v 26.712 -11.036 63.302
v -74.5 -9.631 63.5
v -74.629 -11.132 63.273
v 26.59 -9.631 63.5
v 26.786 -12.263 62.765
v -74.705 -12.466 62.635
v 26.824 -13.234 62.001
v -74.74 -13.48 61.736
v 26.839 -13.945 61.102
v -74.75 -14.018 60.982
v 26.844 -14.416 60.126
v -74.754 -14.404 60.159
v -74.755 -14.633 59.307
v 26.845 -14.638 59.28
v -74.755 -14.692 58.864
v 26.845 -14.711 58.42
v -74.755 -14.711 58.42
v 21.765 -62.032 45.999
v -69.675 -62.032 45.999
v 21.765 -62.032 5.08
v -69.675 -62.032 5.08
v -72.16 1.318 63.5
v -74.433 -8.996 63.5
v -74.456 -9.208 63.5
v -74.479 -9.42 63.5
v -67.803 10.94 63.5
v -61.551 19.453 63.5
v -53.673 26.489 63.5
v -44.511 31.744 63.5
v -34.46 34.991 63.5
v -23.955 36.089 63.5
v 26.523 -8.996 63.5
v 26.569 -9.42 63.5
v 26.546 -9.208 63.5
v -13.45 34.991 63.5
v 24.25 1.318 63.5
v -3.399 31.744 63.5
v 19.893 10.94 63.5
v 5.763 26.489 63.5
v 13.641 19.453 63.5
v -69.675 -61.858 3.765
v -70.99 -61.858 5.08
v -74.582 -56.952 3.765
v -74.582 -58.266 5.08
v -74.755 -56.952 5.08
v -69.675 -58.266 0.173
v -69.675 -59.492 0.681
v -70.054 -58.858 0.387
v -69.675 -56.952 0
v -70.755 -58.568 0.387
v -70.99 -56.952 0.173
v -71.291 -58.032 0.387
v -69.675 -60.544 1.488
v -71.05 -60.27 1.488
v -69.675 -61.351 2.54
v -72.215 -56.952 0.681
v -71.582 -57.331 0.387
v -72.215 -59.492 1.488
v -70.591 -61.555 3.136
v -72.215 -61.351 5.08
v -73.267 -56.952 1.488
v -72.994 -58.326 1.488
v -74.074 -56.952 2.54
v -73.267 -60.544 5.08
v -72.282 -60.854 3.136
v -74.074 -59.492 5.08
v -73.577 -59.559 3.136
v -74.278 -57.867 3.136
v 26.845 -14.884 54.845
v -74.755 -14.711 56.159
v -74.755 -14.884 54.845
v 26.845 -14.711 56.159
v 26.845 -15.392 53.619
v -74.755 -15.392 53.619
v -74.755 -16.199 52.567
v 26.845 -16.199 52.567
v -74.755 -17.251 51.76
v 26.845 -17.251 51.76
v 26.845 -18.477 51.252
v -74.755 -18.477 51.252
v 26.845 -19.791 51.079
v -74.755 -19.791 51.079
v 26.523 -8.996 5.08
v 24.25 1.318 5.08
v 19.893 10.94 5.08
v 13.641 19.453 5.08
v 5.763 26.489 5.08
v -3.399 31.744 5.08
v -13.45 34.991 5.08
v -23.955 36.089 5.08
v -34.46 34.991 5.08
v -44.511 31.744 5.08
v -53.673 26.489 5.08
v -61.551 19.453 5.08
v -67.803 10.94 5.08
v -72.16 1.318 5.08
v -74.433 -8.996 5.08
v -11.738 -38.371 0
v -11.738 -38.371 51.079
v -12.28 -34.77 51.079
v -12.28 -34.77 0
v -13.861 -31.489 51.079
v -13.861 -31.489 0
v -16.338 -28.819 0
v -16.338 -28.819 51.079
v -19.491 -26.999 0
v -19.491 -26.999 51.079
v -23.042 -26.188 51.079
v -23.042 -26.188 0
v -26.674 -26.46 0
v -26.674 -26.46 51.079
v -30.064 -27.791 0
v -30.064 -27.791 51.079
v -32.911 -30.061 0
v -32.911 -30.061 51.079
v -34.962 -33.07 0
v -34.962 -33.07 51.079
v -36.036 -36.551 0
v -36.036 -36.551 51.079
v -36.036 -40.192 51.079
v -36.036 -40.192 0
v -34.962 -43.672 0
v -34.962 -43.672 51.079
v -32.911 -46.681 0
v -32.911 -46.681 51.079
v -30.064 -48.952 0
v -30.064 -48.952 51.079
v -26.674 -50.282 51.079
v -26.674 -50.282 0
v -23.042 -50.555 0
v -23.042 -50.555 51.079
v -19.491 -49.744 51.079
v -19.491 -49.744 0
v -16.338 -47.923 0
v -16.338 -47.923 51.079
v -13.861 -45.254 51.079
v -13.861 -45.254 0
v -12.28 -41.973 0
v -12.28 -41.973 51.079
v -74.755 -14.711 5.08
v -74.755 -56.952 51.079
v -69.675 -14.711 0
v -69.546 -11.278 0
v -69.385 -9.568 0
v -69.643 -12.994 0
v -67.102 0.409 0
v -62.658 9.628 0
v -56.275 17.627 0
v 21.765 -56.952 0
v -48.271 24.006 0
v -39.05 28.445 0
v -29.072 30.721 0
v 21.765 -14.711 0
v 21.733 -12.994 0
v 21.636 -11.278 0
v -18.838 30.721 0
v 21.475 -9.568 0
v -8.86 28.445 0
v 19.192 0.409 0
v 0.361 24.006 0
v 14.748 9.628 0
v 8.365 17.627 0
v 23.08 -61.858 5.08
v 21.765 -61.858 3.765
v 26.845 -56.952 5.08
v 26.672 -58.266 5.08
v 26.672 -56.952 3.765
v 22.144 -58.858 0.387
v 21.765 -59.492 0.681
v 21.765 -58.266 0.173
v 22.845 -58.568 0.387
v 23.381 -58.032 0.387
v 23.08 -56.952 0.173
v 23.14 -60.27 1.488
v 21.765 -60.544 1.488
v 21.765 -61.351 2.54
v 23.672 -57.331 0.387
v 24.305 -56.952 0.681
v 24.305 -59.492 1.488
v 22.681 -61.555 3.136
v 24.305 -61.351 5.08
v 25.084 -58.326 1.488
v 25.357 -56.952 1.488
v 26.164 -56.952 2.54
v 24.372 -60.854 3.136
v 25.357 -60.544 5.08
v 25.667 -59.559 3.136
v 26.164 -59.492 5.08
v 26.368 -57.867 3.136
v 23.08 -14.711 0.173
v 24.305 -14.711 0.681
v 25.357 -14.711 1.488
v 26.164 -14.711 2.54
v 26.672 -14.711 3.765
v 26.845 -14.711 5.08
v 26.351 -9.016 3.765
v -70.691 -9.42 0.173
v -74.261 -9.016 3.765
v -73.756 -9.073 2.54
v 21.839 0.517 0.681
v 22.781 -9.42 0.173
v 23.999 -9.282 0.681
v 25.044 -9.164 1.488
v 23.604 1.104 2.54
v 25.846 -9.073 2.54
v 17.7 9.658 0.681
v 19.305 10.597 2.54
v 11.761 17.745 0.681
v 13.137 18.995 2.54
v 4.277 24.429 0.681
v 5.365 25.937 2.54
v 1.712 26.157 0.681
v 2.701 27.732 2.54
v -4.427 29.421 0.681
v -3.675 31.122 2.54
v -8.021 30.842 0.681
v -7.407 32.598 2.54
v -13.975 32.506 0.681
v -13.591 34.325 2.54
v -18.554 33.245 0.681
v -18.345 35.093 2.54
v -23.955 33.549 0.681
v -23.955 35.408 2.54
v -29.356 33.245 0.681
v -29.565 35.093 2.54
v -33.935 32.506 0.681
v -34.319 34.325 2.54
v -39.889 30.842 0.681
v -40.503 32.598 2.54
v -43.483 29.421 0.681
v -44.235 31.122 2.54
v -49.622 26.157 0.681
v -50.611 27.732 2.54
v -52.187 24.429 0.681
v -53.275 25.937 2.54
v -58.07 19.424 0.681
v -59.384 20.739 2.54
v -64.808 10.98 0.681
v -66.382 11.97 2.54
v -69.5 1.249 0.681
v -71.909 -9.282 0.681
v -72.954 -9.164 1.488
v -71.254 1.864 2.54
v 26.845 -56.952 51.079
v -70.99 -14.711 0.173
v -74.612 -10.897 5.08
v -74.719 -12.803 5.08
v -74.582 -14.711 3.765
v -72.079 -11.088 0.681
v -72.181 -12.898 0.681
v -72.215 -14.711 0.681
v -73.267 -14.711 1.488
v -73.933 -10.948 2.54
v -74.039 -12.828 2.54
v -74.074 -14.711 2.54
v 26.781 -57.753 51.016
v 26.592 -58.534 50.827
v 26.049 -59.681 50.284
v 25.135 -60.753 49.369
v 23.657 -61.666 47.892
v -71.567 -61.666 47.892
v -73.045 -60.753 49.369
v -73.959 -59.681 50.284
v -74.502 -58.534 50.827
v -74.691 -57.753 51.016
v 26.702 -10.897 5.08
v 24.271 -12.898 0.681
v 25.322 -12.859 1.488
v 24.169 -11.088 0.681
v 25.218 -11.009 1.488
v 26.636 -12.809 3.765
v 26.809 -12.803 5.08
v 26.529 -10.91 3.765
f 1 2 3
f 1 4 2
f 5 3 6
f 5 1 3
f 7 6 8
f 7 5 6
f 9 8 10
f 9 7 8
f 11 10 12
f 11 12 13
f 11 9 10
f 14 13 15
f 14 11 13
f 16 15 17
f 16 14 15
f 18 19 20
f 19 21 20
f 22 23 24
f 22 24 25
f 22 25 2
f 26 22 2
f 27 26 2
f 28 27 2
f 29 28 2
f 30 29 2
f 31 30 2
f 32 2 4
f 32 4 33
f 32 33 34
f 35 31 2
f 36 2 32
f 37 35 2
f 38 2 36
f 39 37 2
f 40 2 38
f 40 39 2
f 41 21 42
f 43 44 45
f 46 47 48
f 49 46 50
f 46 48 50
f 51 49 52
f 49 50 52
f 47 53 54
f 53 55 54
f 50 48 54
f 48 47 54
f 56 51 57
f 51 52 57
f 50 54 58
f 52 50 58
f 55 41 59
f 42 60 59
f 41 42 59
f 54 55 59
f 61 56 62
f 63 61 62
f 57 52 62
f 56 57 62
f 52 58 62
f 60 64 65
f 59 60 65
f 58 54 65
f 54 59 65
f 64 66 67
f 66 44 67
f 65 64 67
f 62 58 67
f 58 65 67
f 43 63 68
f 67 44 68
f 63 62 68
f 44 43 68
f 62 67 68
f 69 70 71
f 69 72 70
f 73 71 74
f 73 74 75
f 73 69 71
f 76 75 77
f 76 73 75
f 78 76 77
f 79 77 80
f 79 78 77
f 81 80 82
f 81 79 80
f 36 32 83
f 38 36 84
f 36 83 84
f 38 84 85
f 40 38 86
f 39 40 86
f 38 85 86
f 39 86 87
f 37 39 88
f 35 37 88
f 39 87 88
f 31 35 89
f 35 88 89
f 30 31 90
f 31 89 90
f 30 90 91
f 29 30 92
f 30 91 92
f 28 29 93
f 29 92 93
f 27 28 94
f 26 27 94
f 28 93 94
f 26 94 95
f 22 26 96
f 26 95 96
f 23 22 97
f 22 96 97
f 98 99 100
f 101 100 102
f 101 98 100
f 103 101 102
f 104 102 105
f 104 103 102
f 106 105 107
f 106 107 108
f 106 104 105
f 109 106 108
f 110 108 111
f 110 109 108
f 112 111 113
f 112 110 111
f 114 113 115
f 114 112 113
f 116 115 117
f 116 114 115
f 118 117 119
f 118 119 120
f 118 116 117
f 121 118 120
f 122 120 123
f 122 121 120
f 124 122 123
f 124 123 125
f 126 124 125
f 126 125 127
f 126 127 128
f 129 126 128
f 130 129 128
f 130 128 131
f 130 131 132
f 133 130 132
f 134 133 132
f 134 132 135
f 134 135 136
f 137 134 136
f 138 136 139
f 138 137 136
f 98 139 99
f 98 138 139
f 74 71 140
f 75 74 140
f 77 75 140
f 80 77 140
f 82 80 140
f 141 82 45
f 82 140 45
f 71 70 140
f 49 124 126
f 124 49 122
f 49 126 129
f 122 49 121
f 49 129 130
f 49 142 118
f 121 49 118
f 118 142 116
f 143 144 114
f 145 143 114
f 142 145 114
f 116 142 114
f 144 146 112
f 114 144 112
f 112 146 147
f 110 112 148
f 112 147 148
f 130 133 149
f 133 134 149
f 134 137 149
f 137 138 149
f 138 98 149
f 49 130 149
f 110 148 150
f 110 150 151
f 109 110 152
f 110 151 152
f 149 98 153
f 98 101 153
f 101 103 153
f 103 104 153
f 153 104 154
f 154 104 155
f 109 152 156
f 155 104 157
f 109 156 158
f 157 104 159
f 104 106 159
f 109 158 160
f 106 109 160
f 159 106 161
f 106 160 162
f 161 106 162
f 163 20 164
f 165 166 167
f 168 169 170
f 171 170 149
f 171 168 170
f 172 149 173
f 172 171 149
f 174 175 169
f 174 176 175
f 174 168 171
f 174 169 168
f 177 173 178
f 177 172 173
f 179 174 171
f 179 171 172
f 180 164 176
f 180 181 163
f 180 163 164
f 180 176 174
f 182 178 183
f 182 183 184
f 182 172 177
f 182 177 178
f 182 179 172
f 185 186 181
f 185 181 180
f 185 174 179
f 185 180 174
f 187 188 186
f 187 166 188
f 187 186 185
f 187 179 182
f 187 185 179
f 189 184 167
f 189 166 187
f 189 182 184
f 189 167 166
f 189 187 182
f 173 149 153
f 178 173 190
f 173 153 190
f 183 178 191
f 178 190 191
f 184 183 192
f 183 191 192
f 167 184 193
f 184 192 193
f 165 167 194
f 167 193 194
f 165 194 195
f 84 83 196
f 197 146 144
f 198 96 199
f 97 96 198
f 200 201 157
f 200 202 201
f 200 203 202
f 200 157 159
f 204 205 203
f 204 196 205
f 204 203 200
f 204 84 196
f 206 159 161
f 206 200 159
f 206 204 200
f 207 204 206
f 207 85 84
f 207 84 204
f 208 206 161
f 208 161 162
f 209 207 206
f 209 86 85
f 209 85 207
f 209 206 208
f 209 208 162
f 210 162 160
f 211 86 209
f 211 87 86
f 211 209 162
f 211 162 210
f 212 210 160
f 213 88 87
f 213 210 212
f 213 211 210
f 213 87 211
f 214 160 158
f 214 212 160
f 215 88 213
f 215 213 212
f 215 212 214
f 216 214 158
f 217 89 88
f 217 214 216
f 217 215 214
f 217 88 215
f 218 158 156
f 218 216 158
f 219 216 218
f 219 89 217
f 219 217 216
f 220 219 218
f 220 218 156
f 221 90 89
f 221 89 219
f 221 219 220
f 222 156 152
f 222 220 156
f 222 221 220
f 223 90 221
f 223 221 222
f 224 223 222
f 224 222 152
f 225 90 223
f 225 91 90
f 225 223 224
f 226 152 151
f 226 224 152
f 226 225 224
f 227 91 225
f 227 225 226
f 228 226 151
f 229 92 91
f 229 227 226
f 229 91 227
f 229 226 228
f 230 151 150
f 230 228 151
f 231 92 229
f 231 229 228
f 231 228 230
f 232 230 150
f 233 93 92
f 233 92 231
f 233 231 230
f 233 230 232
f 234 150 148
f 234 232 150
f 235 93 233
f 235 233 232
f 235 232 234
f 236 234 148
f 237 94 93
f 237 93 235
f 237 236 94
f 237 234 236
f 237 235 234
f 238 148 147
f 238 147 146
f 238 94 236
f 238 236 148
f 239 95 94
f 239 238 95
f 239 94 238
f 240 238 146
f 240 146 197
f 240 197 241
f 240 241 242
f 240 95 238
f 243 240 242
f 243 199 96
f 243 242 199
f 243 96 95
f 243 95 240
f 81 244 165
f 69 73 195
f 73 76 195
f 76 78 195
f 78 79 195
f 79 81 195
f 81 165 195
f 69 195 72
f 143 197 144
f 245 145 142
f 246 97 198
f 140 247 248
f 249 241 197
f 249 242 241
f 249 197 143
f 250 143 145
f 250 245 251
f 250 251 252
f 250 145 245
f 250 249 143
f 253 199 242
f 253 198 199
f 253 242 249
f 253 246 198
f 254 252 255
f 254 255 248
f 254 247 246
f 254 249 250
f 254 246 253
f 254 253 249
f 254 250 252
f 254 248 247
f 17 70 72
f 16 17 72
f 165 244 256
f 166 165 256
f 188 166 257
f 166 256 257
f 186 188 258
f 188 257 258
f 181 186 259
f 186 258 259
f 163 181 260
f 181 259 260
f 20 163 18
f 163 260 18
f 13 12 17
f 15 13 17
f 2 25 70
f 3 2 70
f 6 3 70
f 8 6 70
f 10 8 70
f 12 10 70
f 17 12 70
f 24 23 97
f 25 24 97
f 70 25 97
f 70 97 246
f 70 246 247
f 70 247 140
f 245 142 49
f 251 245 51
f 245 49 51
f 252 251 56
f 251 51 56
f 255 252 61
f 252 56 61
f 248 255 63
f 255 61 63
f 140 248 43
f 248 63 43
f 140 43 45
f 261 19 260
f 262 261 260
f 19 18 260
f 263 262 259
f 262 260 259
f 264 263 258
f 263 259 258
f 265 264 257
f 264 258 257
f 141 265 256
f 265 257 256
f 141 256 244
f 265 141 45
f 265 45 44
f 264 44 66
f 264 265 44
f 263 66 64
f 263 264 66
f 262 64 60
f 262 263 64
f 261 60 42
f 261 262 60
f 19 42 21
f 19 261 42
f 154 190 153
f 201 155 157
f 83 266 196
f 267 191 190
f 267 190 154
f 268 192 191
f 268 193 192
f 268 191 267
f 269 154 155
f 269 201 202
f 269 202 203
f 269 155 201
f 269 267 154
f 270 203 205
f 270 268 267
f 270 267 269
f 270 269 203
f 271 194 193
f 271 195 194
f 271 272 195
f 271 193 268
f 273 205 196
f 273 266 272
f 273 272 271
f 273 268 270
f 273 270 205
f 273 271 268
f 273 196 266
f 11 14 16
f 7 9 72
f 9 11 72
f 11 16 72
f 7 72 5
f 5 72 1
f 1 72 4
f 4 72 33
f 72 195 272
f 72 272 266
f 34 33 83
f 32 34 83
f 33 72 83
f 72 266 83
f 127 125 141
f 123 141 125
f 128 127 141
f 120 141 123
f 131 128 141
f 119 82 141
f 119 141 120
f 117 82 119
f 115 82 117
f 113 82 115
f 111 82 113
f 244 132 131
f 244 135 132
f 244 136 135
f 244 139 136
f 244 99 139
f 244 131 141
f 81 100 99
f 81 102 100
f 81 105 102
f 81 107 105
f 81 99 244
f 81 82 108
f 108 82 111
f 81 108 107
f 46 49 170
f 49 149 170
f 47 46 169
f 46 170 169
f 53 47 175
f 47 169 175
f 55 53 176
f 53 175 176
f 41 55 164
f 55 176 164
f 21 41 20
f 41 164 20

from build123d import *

# Parameters (mm, degrees)
F0_W     = 101.6
F0_H     = 35.88385
F0_R     = 12.2174
F0_H_2   = 5.72135
F0_H_3   = 5.715
F1_DEPTH = 51.0794
F2_DEPTH = 63.5
F3_R     = 5.08


with BuildPart() as f1:
    # F0 (on Top) → F1 (new body)
    with BuildSketch(Plane.XY):
        with Locations((-23.954998, -38.374585)):
            Rectangle(F0_W, F0_H)
        with Locations((-23.954998, -38.37141)):
            Circle(F0_R, mode=Mode.SUBTRACT)
        with Locations((-23.954998, -17.571985)):
            Rectangle(F0_W, F0_H_2)
        with Locations((-23.954998, -59.17401)):
            Rectangle(F0_W, F0_H_3)
    extrude(amount=F1_DEPTH)

    # F0 (on Top) → F2 (join)
    with BuildSketch(Plane.XY):
        with BuildLine():
            ThreePointArc((26.522509, -8.99631), (-23.954998, 36.08869), (-74.432506, -8.99631))
            Line((-74.432506, -8.99631), (26.522509, -8.99631))
        make_face()
        with BuildLine():
            ThreePointArc((-74.432506, -8.99631), (-74.674311, -11.849264), (-74.754998, -14.71131))
            Line((-74.754998, -14.71131), (26.845002, -14.71131))
            ThreePointArc((26.845002, -14.71131), (26.764315, -11.849264), (26.522509, -8.99631))
            Line((26.522509, -8.99631), (-74.432506, -8.99631))
        make_face()
    extrude(amount=F2_DEPTH)

    # F3
    f3_edges = [f1.edges().sort_by_distance(p)[0] for p in [
        (-23.954998, -62.03151, 51.0794),
        (-23.954998, -14.71131, 51.0794),
        (-23.954998, -14.71131, 63.5),
        (26.845002, -62.03151, 25.5397),
        (-74.754998, -62.03151, 25.5397),
        (-23.954998, -62.03151, 0),
        (26.845002, -38.37141, 0),
    ]]
    fillet(f3_edges, radius=F3_R)


solid = f1.part
